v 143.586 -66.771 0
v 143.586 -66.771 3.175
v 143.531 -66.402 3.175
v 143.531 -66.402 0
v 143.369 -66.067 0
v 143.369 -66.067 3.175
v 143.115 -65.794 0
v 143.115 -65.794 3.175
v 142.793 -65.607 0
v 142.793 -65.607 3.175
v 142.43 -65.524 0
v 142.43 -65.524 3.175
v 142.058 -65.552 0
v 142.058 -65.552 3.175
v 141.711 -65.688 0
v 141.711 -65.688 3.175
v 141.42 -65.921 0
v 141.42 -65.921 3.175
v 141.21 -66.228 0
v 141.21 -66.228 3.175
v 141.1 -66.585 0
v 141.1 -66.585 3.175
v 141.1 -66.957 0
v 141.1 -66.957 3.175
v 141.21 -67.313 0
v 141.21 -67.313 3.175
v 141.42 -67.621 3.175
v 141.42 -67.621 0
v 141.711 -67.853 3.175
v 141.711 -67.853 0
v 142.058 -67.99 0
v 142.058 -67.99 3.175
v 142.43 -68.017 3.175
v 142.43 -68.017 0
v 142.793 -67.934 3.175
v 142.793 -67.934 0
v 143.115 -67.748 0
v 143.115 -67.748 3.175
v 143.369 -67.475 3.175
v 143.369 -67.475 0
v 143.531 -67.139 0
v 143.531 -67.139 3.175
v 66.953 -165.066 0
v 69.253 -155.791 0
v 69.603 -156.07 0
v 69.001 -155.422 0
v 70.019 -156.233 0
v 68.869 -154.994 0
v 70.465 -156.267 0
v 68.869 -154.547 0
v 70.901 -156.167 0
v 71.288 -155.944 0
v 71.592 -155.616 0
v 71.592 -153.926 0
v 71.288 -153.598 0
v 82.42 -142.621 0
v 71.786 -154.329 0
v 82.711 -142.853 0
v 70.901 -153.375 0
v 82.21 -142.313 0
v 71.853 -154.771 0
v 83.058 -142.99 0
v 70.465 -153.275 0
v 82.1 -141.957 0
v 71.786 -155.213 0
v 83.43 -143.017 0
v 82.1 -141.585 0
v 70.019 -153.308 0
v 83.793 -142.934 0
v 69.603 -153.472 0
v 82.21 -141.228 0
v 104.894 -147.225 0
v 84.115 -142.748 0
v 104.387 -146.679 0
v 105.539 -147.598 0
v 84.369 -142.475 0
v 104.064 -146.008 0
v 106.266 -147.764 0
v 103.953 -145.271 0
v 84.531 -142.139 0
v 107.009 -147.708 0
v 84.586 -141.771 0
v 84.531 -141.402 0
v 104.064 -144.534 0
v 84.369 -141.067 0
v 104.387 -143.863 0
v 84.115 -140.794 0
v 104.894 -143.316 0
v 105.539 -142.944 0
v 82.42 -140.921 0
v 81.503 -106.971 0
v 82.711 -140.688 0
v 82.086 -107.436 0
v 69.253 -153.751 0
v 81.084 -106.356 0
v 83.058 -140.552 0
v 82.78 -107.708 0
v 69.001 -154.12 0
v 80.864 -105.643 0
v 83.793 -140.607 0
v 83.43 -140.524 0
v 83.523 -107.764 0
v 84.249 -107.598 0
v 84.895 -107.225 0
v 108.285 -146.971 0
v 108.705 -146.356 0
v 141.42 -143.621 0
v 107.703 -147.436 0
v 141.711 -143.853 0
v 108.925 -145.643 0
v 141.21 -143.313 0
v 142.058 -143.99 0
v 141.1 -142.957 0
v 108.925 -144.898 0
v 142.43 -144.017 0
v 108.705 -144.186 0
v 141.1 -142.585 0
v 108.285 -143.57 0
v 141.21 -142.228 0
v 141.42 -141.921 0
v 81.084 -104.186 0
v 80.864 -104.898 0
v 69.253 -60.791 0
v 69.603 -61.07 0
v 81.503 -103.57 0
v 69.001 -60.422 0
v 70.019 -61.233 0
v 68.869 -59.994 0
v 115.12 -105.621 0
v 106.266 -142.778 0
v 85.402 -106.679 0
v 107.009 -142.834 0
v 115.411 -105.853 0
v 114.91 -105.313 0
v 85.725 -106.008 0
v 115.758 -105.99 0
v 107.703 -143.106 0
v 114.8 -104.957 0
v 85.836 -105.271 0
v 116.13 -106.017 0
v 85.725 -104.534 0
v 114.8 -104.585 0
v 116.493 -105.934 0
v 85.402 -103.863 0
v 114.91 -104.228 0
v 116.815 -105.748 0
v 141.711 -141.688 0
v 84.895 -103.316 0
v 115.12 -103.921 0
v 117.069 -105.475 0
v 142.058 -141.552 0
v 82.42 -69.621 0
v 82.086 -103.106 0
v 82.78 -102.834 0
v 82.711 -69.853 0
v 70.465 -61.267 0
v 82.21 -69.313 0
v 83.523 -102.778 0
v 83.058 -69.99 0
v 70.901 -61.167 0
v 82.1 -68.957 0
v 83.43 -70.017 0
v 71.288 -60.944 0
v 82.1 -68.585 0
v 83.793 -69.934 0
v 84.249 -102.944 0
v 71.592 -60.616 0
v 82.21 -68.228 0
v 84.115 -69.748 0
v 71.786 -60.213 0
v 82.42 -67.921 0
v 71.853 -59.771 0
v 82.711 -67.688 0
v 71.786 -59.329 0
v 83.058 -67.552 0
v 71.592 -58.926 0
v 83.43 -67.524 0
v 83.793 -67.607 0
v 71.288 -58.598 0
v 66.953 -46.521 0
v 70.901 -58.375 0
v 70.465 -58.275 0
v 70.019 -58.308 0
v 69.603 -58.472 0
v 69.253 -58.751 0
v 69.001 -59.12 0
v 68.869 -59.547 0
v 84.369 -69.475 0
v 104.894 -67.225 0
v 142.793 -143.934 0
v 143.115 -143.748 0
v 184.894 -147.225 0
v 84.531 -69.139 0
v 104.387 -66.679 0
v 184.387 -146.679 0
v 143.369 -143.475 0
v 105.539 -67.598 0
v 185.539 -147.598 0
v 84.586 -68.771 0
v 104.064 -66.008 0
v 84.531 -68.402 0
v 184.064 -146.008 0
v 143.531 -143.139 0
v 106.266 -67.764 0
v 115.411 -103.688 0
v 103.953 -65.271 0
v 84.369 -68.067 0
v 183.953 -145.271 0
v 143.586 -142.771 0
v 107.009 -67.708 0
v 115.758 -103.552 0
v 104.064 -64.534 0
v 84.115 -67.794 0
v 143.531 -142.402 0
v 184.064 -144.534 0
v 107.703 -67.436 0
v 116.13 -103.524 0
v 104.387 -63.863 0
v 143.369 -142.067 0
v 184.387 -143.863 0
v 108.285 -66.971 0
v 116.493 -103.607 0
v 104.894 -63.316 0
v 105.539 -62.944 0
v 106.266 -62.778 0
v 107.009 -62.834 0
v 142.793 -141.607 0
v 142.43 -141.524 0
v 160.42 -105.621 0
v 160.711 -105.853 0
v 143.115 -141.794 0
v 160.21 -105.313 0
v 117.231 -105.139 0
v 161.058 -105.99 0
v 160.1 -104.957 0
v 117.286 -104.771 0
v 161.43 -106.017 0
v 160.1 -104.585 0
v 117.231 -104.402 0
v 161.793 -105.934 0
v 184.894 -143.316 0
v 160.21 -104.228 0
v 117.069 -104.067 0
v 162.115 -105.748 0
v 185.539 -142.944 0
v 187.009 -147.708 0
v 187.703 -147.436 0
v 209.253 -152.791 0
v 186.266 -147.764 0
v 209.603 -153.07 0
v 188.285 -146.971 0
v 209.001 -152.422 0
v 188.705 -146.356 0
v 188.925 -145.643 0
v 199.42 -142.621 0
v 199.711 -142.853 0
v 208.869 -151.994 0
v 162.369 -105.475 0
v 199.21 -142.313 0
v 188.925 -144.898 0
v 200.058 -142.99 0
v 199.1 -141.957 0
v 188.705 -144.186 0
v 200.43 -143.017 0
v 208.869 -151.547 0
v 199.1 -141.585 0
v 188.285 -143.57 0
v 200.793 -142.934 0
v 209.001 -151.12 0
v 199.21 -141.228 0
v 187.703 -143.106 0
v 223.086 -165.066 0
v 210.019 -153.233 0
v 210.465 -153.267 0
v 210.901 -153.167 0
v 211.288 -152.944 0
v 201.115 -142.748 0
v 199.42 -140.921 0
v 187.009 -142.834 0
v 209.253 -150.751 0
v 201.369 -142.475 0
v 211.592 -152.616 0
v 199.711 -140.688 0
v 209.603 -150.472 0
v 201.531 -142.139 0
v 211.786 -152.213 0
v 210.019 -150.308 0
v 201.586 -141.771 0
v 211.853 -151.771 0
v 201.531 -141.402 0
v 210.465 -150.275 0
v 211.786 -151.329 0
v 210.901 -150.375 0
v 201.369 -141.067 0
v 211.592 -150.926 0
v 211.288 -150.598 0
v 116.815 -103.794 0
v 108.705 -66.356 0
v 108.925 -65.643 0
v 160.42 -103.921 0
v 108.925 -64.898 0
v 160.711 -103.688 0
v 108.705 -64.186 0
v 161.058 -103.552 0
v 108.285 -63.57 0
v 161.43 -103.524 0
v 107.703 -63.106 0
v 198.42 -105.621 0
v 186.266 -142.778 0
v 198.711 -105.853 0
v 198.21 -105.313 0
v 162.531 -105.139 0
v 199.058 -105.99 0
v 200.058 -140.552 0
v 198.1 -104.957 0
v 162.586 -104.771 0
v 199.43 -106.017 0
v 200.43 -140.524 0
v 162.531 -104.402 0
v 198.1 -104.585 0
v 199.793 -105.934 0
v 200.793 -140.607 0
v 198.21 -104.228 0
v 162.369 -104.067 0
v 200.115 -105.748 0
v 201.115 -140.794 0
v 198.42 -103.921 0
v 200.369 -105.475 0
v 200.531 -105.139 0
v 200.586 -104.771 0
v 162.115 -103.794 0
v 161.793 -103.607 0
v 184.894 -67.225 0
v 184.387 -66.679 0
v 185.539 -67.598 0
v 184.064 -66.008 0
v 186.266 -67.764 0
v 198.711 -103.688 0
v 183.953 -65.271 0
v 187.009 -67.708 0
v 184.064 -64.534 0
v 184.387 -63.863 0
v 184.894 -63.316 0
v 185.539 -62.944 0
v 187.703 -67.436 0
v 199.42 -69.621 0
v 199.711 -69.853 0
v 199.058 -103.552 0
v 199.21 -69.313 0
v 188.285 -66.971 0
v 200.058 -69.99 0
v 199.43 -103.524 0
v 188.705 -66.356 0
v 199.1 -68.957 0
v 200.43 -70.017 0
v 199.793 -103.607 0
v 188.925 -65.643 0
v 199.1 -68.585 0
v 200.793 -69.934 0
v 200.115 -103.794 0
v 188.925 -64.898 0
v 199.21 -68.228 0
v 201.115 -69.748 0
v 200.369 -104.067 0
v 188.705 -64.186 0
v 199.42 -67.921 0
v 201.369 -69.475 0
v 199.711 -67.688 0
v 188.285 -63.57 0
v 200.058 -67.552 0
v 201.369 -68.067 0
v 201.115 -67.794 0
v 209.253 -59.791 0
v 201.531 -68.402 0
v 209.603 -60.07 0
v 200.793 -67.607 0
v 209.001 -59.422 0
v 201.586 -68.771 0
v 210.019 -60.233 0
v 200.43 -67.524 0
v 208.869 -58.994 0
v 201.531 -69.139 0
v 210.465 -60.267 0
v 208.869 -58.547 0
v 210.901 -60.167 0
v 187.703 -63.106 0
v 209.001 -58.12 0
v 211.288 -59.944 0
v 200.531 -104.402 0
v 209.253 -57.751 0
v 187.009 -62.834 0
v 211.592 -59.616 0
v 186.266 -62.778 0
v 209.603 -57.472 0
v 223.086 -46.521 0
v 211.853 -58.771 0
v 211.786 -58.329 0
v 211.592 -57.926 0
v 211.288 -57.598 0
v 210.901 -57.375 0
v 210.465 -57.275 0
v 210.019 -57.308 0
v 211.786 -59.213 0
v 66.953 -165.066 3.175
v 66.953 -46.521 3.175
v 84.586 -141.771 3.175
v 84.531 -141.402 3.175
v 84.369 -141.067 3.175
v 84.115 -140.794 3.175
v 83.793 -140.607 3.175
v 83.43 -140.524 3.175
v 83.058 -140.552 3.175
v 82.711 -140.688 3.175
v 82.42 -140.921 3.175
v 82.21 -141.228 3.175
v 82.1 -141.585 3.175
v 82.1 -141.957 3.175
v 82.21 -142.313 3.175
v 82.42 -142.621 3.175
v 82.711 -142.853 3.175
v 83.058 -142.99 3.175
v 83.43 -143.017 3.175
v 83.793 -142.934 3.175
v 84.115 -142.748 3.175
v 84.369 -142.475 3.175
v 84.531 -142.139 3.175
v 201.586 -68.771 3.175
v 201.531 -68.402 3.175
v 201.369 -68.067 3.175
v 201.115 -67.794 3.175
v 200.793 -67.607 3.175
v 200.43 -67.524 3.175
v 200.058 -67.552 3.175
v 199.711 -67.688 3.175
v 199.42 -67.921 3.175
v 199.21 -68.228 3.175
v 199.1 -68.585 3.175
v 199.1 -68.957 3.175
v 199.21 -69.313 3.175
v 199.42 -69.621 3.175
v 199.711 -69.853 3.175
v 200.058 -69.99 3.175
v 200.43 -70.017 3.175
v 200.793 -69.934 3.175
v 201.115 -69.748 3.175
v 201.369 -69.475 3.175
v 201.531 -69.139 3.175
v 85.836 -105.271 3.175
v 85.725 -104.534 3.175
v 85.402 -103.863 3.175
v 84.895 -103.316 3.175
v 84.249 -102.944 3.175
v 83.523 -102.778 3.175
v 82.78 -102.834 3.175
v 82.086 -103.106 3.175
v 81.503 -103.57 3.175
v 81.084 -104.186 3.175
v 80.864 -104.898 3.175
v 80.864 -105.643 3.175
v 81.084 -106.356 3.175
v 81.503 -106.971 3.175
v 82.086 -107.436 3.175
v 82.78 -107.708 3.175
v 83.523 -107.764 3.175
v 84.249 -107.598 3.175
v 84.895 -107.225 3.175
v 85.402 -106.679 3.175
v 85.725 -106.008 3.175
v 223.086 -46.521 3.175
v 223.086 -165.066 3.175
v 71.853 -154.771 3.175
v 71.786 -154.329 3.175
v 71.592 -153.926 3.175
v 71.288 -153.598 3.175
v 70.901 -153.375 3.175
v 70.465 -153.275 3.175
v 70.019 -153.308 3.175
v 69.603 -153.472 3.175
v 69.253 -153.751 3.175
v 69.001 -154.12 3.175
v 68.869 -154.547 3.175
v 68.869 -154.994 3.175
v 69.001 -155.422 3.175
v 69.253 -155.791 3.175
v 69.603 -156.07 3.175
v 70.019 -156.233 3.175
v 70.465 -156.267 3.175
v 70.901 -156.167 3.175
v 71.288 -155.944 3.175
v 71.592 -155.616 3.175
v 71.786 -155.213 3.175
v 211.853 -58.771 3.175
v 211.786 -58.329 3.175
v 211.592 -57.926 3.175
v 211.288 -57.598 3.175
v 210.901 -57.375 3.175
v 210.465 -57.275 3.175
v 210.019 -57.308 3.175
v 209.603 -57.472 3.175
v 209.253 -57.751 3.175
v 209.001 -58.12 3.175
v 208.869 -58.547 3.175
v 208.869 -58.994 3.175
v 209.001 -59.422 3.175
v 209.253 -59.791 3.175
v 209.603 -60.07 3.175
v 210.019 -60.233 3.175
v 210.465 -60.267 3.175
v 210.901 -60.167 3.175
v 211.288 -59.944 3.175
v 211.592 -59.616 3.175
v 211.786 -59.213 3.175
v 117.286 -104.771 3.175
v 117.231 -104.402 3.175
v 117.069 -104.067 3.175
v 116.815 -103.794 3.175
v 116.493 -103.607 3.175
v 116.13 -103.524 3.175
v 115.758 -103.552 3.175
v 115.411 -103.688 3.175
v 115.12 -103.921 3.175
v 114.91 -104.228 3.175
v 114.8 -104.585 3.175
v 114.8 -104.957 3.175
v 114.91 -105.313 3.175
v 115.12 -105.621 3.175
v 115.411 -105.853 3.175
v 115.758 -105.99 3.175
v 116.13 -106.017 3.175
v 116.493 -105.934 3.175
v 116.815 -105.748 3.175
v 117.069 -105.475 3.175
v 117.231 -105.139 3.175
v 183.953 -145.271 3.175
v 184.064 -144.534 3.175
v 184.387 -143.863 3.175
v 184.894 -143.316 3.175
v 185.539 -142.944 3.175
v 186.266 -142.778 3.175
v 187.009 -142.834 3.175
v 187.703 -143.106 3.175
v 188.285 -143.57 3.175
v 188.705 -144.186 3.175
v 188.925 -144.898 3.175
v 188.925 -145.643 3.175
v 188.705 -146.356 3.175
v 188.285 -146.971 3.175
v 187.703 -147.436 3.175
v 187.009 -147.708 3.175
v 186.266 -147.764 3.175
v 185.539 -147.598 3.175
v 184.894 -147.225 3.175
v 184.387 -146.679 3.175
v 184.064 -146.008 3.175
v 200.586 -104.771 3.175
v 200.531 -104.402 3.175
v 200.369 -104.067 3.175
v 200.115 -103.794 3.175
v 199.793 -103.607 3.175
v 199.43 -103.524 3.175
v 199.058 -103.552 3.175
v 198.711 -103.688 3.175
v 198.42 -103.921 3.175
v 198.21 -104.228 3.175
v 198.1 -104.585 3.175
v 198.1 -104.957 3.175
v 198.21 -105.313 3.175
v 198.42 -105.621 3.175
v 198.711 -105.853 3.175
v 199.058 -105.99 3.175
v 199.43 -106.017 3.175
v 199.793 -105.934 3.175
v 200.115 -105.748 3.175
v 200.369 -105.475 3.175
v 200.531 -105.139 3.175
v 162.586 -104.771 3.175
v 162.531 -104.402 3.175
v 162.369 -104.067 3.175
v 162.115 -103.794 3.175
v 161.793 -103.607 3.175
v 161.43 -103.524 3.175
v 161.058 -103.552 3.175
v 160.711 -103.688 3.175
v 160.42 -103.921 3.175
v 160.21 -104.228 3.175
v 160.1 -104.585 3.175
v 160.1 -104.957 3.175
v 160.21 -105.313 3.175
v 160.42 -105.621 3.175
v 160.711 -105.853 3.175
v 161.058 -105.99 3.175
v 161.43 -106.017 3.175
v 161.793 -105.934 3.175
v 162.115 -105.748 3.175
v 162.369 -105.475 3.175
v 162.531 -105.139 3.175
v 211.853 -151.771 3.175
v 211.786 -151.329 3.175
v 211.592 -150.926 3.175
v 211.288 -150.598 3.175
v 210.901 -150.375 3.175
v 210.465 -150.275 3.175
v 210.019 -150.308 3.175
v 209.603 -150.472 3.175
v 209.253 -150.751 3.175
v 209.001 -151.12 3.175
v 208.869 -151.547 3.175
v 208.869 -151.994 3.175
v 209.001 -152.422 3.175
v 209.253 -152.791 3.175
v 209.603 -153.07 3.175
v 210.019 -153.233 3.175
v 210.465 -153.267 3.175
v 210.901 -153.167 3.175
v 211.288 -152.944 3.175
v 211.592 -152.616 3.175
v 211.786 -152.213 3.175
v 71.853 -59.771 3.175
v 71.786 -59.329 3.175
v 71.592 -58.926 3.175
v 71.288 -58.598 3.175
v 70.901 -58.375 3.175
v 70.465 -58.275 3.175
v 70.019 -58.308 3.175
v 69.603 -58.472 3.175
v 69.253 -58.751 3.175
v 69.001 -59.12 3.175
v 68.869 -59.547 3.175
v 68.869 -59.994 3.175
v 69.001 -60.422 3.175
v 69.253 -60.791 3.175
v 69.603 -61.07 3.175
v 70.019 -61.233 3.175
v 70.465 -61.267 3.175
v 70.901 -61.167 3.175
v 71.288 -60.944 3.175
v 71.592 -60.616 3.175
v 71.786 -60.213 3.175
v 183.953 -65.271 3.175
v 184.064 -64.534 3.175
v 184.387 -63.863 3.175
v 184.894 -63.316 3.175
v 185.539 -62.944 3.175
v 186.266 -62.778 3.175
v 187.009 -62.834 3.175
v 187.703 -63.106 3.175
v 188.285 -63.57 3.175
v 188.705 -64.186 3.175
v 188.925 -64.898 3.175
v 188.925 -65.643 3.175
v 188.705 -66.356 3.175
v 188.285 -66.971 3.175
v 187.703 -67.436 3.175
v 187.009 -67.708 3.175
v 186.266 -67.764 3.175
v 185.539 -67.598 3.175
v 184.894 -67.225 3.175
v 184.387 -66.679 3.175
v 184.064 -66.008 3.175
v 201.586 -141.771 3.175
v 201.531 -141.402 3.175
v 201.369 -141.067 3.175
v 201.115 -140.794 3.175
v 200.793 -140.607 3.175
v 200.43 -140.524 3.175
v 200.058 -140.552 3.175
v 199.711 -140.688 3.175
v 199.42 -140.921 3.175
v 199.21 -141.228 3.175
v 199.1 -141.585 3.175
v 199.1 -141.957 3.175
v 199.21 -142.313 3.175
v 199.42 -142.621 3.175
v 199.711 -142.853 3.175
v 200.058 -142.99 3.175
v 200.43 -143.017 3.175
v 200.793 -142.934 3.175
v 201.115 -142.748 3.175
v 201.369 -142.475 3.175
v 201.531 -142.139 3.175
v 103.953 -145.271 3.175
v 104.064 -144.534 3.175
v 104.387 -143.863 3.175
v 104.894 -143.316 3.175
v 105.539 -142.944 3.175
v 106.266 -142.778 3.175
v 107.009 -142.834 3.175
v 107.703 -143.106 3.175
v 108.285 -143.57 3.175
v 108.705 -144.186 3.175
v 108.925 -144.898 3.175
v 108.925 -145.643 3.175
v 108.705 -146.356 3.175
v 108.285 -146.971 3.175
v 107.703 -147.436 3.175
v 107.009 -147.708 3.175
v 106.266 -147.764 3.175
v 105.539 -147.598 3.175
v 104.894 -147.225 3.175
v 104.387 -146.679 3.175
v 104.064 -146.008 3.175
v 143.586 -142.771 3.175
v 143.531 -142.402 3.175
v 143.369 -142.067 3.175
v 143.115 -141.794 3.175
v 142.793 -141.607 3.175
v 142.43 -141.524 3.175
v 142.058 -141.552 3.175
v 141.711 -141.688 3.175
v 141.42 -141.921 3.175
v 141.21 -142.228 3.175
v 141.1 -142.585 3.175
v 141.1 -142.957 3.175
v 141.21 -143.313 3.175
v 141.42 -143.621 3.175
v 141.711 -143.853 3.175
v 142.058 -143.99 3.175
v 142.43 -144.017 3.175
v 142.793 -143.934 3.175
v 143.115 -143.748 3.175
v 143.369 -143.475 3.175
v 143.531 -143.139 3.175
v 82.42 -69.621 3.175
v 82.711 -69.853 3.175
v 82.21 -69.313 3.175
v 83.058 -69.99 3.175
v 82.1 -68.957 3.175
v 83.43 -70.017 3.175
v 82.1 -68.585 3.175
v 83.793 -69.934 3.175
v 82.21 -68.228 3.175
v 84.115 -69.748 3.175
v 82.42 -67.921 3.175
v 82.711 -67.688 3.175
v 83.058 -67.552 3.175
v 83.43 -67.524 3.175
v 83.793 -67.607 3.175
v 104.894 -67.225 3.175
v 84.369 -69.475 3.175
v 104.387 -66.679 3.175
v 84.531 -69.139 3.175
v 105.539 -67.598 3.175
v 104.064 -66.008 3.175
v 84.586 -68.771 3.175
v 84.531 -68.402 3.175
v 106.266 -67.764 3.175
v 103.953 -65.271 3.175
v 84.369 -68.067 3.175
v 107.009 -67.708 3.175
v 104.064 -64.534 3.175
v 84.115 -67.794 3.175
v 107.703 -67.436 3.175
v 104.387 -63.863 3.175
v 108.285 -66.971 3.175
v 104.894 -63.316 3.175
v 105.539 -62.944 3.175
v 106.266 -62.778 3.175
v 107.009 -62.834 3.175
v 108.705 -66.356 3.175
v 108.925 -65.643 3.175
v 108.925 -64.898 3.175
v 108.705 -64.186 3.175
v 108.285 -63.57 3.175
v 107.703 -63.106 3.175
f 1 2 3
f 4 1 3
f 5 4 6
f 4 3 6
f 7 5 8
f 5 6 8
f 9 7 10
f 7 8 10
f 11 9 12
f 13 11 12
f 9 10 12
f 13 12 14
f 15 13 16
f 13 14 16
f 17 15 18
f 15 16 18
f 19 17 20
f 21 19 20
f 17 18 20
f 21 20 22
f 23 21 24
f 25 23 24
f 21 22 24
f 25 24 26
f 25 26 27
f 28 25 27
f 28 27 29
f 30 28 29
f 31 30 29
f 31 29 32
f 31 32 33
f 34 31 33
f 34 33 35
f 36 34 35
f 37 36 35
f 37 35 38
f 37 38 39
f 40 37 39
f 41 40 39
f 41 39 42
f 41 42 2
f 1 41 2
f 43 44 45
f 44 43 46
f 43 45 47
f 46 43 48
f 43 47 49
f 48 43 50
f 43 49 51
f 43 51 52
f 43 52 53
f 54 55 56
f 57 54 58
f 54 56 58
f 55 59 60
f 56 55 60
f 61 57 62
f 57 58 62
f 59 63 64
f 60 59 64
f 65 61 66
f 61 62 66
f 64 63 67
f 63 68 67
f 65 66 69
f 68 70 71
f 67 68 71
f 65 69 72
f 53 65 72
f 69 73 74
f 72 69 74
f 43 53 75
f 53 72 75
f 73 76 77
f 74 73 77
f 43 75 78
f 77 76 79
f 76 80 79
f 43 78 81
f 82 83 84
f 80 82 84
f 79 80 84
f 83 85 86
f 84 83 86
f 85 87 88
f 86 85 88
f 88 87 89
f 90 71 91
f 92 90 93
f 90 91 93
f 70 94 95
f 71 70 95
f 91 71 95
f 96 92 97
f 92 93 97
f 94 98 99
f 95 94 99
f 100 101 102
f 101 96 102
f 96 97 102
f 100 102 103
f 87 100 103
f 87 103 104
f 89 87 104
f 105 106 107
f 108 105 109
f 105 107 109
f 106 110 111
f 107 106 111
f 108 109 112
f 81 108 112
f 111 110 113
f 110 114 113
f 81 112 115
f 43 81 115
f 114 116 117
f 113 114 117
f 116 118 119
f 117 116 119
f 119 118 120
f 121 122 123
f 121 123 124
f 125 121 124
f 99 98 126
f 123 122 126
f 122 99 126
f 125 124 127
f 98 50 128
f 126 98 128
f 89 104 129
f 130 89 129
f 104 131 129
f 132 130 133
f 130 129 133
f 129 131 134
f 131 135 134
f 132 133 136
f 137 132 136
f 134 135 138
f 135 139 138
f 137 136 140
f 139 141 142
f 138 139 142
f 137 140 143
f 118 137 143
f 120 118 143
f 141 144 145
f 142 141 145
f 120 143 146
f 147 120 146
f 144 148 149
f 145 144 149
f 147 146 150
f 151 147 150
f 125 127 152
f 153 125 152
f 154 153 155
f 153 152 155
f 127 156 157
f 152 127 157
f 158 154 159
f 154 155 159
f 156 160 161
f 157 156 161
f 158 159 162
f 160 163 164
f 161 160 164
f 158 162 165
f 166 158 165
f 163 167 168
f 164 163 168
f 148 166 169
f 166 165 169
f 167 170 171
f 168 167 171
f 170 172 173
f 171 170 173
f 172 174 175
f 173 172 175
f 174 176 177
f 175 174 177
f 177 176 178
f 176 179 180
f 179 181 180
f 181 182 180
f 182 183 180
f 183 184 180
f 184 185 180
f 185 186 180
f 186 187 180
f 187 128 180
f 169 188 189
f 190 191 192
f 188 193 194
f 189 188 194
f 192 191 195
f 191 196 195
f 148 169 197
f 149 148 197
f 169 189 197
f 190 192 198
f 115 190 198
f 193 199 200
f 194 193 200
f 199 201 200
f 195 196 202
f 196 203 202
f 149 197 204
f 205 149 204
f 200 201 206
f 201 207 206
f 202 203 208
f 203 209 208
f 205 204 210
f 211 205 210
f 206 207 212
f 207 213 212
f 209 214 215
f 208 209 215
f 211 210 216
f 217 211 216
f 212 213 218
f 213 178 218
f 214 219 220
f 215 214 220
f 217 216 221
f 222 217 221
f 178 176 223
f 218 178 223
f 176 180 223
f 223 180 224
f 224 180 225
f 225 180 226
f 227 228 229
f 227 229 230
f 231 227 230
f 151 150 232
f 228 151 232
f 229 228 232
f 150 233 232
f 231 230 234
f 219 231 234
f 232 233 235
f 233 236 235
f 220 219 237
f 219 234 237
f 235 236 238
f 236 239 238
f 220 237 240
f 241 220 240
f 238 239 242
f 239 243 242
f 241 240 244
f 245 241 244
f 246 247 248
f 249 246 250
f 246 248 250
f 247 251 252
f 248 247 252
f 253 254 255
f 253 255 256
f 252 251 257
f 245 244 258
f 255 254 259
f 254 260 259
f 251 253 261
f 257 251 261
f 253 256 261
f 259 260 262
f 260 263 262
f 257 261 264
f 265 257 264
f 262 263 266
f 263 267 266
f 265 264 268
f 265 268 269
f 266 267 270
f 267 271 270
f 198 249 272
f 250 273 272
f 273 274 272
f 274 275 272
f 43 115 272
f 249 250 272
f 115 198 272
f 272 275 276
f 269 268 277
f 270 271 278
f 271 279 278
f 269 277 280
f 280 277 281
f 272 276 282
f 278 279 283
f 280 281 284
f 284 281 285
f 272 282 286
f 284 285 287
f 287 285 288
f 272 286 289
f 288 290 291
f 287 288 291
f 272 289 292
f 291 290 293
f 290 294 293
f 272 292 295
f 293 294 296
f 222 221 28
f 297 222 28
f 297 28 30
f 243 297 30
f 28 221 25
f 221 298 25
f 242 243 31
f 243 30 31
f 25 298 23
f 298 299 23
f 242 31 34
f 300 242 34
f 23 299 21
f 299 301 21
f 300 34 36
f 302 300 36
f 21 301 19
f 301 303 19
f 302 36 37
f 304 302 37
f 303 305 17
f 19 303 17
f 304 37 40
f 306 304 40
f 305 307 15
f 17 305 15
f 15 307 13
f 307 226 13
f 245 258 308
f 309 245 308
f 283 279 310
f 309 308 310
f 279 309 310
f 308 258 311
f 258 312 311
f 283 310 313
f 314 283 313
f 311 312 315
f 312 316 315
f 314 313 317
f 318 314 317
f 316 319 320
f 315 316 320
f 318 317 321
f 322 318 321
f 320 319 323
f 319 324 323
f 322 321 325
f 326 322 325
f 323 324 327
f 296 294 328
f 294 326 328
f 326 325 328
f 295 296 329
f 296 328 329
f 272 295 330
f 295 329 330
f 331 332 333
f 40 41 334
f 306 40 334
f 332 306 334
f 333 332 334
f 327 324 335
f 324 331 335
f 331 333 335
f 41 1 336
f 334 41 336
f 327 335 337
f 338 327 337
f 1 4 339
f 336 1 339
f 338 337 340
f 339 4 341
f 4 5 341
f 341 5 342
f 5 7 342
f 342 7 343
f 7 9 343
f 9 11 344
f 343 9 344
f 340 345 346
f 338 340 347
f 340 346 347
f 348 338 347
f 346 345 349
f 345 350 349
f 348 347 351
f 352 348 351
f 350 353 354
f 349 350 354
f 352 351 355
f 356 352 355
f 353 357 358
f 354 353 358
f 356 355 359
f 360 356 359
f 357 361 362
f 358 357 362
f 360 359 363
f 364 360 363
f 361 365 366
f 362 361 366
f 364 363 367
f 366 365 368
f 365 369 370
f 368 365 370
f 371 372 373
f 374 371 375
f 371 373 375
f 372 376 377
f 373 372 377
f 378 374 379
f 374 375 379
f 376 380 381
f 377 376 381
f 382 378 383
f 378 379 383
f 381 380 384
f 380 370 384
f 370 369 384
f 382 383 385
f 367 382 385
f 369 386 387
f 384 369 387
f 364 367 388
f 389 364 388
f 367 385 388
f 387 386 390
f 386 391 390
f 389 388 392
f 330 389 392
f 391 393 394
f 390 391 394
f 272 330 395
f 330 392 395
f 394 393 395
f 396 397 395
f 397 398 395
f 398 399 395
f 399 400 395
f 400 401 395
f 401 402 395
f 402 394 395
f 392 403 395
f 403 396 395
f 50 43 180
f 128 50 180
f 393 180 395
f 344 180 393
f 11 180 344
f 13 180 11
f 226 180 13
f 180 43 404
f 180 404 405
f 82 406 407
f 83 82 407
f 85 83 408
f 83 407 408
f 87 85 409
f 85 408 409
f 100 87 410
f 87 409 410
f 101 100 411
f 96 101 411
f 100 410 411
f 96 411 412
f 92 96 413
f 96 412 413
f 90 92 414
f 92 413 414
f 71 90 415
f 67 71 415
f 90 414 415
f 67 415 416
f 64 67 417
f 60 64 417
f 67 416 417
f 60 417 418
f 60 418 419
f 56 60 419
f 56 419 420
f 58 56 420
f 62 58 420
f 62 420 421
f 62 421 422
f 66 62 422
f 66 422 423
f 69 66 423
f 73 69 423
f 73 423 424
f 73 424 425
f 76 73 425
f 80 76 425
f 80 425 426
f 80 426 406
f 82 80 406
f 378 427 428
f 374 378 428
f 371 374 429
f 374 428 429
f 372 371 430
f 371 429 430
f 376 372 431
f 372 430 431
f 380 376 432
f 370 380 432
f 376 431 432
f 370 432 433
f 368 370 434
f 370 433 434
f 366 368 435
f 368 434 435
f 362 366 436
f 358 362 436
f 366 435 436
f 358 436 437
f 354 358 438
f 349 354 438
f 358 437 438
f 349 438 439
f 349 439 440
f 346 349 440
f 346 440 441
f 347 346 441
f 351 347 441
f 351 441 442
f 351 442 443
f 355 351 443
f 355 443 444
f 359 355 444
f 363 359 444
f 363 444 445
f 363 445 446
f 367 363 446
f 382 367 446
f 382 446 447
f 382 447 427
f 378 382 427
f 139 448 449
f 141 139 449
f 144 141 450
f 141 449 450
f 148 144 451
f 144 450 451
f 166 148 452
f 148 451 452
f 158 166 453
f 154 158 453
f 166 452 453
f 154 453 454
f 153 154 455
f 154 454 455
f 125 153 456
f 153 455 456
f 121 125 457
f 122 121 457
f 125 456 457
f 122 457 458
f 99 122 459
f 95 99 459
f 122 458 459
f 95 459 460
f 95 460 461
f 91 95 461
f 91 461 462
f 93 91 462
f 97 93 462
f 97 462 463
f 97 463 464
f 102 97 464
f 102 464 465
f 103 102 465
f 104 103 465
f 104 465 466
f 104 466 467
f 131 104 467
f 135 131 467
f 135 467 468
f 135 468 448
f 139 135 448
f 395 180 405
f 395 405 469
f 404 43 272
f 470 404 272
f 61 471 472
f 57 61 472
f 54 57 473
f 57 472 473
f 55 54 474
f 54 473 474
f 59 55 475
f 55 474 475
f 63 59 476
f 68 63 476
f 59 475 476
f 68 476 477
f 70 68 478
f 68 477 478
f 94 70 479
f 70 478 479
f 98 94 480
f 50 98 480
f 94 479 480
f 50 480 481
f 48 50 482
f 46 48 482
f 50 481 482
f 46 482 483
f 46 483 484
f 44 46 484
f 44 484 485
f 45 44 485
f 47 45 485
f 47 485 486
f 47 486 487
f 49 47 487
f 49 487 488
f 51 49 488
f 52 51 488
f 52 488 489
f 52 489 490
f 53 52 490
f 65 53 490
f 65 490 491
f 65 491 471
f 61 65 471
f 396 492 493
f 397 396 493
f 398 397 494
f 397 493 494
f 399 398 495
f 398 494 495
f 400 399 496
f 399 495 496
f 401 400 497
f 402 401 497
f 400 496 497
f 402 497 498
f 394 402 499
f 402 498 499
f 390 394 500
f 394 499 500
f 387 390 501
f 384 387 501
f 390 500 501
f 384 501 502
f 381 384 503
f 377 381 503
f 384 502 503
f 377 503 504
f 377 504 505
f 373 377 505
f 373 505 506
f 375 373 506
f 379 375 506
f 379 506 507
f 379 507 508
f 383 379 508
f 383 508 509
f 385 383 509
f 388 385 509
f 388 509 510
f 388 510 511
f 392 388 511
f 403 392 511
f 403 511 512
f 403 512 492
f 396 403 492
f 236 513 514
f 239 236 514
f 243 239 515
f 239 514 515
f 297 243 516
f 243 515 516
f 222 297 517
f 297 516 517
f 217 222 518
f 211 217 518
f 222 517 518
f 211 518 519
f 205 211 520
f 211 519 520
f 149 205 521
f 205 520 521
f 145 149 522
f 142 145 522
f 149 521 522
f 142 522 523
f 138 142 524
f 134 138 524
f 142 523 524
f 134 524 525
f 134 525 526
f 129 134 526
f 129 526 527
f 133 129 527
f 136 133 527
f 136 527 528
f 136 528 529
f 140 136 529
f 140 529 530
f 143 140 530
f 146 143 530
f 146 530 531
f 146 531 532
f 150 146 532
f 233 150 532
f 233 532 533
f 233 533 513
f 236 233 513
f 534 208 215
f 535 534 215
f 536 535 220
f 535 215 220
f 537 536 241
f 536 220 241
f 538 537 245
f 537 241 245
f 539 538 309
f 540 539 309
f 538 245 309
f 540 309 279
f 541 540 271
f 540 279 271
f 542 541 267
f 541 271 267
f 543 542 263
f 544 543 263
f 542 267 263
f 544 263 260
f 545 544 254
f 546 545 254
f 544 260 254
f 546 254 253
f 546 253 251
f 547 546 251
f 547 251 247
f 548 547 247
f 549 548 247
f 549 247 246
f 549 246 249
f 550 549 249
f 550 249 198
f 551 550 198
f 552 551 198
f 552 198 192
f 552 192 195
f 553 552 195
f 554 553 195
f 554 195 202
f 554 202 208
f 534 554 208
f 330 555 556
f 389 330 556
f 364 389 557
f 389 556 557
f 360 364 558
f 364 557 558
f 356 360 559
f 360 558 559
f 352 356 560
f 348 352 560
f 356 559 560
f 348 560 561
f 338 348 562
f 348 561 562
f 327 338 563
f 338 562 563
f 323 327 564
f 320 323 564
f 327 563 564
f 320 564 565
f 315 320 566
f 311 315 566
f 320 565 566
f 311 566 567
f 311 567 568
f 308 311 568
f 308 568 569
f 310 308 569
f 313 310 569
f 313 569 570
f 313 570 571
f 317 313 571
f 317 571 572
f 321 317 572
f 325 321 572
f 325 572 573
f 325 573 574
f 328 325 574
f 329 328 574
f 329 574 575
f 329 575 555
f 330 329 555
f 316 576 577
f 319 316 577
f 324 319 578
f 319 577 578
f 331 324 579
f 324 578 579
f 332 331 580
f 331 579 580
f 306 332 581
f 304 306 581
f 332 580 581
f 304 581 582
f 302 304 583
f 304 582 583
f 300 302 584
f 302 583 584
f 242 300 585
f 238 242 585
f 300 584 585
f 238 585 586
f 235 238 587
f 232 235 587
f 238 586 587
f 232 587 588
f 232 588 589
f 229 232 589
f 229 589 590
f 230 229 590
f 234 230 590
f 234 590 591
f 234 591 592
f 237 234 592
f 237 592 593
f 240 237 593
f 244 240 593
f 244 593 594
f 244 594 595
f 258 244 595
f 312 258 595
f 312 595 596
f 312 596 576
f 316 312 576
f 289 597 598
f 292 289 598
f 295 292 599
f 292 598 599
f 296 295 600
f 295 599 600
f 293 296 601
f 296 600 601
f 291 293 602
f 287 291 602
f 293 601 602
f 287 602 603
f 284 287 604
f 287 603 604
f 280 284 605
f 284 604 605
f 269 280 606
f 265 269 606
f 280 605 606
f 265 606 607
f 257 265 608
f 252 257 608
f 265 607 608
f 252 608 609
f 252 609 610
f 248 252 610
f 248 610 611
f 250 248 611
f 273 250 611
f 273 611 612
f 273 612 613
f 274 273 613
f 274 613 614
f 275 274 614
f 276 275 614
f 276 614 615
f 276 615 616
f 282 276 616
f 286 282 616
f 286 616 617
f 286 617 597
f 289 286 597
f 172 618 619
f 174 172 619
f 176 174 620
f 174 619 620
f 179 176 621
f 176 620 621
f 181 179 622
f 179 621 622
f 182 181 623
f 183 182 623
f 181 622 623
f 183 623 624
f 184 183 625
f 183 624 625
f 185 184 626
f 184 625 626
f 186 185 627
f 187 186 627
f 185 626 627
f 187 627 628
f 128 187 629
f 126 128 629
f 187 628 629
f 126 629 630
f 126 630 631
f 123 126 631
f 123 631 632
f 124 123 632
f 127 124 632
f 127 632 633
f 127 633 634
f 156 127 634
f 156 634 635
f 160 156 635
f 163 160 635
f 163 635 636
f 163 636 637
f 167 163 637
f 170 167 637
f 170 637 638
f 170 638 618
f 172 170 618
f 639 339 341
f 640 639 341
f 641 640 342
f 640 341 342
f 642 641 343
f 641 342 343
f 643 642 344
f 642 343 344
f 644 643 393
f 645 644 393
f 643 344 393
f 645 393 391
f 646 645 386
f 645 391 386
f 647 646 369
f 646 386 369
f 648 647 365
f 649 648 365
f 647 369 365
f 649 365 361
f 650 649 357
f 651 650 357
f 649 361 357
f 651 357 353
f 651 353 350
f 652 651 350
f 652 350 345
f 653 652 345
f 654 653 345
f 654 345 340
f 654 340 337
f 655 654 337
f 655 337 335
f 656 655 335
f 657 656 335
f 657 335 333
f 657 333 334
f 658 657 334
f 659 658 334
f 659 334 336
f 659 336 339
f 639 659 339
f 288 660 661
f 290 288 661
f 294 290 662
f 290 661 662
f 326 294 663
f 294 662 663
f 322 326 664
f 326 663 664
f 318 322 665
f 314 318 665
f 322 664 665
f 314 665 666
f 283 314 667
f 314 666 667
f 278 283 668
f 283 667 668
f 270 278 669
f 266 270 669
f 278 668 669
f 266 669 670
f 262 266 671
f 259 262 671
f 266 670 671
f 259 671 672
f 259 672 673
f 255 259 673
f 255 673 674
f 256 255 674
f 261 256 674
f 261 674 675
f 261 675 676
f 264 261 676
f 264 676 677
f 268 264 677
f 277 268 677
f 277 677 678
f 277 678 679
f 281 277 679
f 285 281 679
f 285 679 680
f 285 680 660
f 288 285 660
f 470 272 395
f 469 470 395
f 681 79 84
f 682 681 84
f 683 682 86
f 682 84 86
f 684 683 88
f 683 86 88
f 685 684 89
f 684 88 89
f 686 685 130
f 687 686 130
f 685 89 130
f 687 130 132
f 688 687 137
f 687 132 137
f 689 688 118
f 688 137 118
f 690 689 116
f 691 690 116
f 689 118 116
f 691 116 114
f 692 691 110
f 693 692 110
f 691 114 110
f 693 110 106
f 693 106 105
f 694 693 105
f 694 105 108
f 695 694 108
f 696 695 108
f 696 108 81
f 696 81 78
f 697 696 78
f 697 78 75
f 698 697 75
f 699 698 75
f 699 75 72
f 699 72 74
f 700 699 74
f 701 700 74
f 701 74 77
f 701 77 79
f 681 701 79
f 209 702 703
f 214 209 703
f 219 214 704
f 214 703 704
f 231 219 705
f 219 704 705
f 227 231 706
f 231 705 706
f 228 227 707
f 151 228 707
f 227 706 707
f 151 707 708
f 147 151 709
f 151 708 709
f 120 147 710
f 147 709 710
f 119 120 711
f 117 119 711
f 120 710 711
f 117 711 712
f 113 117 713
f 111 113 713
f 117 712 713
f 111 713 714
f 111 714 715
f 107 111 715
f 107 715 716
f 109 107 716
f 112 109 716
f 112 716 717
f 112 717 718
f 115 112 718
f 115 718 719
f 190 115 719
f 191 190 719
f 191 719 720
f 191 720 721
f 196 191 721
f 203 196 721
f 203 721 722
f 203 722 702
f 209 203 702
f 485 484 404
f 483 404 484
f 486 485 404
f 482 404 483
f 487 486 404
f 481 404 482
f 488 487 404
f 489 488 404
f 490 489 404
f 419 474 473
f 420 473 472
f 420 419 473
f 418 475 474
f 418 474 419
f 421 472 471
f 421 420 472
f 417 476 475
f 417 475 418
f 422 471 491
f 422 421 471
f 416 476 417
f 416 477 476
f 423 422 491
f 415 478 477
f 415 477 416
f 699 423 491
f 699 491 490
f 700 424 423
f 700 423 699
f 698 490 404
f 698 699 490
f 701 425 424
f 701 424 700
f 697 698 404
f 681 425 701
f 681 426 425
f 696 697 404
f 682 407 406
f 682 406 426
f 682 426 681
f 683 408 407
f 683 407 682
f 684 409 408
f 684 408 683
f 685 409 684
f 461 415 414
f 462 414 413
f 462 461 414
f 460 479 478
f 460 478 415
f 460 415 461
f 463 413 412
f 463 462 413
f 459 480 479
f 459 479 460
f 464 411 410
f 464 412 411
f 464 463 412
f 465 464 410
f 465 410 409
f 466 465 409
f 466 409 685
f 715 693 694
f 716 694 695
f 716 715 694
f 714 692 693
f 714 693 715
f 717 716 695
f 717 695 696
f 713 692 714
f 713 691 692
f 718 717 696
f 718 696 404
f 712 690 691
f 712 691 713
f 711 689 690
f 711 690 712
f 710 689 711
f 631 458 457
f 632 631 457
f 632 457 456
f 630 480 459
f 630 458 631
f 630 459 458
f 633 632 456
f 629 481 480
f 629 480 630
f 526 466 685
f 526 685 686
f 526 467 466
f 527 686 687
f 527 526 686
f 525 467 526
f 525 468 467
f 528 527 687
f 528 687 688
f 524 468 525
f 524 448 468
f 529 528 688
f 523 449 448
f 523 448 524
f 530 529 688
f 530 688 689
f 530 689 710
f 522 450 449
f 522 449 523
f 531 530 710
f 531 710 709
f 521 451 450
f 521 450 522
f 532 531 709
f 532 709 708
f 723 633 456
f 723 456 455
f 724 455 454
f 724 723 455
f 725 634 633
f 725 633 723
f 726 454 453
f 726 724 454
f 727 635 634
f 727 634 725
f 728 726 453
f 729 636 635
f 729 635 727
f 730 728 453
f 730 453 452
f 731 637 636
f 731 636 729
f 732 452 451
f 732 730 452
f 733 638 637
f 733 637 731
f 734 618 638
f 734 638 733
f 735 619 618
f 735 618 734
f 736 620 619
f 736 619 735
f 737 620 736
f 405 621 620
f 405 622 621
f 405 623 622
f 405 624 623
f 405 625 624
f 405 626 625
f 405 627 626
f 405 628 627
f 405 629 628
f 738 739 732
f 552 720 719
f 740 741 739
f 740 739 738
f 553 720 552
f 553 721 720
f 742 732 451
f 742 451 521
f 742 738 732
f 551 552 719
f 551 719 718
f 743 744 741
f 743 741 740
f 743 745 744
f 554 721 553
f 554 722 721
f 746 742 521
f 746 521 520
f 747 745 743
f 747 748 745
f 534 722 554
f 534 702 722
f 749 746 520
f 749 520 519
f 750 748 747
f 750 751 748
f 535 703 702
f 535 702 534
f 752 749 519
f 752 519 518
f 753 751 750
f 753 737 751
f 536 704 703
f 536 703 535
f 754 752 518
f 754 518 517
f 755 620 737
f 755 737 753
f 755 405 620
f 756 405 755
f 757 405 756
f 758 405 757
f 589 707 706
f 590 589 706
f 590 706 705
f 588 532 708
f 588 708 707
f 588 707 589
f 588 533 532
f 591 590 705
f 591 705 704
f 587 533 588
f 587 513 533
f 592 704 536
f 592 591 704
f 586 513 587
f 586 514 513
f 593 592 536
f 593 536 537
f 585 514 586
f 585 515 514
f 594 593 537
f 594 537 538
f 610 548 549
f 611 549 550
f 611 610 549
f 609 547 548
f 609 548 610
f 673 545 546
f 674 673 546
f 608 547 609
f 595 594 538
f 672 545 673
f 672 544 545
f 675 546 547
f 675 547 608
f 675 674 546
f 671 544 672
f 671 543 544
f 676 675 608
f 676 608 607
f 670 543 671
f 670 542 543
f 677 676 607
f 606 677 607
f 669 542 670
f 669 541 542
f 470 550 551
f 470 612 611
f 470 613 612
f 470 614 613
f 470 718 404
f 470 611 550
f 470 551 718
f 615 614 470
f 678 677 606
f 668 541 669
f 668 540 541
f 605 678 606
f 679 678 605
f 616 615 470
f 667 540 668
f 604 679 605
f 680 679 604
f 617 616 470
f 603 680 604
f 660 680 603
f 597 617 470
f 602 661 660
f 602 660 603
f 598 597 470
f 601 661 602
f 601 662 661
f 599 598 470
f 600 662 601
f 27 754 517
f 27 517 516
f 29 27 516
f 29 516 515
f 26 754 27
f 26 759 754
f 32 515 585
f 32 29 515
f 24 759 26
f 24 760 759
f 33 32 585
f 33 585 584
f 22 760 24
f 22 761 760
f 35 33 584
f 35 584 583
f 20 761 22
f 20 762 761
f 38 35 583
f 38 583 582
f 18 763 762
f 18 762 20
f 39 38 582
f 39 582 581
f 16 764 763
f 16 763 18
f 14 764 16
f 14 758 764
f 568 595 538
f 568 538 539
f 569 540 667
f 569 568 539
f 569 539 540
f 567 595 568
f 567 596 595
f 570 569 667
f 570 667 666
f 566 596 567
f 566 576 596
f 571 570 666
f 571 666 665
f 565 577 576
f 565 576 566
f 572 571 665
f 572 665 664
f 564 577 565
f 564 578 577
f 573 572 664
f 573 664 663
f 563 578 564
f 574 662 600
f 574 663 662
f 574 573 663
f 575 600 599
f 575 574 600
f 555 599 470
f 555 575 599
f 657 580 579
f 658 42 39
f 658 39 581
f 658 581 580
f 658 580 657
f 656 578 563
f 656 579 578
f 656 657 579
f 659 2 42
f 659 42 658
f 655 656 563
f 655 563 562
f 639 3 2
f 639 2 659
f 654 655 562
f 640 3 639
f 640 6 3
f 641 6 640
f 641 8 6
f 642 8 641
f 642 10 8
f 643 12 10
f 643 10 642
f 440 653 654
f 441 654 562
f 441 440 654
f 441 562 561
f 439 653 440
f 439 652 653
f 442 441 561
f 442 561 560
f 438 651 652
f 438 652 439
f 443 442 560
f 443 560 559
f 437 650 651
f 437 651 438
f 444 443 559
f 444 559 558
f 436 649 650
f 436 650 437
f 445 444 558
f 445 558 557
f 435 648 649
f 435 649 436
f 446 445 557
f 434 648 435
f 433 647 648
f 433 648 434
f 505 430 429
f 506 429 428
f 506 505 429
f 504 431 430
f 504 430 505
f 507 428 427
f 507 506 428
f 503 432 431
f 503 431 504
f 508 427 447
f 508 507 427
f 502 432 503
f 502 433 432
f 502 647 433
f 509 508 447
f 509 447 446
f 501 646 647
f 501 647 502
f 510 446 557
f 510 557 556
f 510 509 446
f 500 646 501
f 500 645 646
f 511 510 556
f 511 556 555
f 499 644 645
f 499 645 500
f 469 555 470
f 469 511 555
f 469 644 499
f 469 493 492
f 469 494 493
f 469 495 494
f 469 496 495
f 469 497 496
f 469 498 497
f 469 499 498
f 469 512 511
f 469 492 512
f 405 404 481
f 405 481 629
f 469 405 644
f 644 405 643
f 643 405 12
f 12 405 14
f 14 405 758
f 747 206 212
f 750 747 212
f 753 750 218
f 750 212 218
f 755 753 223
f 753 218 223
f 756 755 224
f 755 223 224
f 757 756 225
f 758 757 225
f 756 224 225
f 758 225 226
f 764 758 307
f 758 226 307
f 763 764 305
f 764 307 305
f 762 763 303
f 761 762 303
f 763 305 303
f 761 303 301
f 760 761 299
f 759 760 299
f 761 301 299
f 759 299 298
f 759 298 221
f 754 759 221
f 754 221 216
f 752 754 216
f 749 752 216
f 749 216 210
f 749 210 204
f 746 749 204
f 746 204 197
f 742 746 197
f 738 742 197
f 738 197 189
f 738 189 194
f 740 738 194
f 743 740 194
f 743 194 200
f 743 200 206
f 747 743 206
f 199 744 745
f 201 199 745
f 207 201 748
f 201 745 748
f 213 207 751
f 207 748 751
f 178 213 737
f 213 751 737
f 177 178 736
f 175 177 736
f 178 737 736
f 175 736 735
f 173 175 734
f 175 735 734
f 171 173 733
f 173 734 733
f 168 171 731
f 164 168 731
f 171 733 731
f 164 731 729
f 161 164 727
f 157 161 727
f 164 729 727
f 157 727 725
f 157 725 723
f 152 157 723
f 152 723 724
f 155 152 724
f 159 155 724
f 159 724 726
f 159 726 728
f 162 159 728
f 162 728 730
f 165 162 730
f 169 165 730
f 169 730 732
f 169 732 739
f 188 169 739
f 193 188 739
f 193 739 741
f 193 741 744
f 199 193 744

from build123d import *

# Parameters (mm, degrees)
SKETCH10_W            = 156.133449978
SKETCH10_H            = 118.545046658
BOSS_EXTRUDE2_DEPTH   = 3.175
F_5_0MM_DOWEL_HOLE1_D = 5
F_3_0MM_DOWEL_HOLE1_D = 3
F_2_5MM_DOWEL_HOLE1_D = 2.5
F_2_5MM_DOWEL_HOLE2_D = 2.5
F_5_0MM_DOWEL_HOLE2_D = 5


with BuildPart() as part:
    # Sketch10 → Boss-Extrude2 (new body)
    with BuildSketch(Plane.XY):
        with Locations((145.019399685, -105.793370226)):
            Rectangle(SKETCH10_W, SKETCH10_H)
    extrude(amount=BOSS_EXTRUDE2_DEPTH)

    # Ø5.0mm Dowel Hole1 (through all)
    with Locations(Plane.XY.offset(3.175)):
        with Locations((106.452674696, -65.270846897), (186.452674696, -65.270846897), (186.452674696, -145.270846897), (106.452674696, -145.270846897)):
            Hole(F_5_0MM_DOWEL_HOLE1_D / 2)

    # Ø3.0mm Dowel Hole1 (through all)
    with Locations(Plane(origin=(0, 0, 0), x_dir=(-1, 0, 0), z_dir=(0, 0, -1))):
        with Locations((-210.352674696, -58.770846897), (-210.352674696, -151.770846897), (-70.352674696, -154.770846897), (-70.352674696, -59.770846897)):
            Hole(F_3_0MM_DOWEL_HOLE1_D / 2)

    # Ø2.5mm Dowel Hole1 (through all)
    with Locations(Plane(origin=(0, 0, 0), x_dir=(-1, 0, 0), z_dir=(0, 0, -1))):
        with Locations((-200.336124674, -68.770846897), (-83.336124674, -68.770846897), (-83.336124674, -141.770846897), (-200.336124674, -141.770846897)):
            Hole(F_2_5MM_DOWEL_HOLE1_D / 2)

    # Ø2.5mm Dowel Hole2 (through all)
    with Locations(Plane(origin=(0, 0, 0), x_dir=(-1, 0, 0), z_dir=(0, 0, -1))):
        with Locations((-199.336124674, -104.770846897), (-161.336124674, -104.770846897), (-116.036124674, -104.770846897), (-142.336124674, -66.770846897), (-142.336124674, -142.770846897)):
            Hole(F_2_5MM_DOWEL_HOLE2_D / 2)

    # Ø5.0mm Dowel Hole2 (through all)
    with Locations(Plane(origin=(0, 0, 0), x_dir=(-1, 0, 0), z_dir=(0, 0, -1))):
        with Locations((-83.336124674, -105.270846897)):
            Hole(F_5_0MM_DOWEL_HOLE2_D / 2)


solid = part.part
